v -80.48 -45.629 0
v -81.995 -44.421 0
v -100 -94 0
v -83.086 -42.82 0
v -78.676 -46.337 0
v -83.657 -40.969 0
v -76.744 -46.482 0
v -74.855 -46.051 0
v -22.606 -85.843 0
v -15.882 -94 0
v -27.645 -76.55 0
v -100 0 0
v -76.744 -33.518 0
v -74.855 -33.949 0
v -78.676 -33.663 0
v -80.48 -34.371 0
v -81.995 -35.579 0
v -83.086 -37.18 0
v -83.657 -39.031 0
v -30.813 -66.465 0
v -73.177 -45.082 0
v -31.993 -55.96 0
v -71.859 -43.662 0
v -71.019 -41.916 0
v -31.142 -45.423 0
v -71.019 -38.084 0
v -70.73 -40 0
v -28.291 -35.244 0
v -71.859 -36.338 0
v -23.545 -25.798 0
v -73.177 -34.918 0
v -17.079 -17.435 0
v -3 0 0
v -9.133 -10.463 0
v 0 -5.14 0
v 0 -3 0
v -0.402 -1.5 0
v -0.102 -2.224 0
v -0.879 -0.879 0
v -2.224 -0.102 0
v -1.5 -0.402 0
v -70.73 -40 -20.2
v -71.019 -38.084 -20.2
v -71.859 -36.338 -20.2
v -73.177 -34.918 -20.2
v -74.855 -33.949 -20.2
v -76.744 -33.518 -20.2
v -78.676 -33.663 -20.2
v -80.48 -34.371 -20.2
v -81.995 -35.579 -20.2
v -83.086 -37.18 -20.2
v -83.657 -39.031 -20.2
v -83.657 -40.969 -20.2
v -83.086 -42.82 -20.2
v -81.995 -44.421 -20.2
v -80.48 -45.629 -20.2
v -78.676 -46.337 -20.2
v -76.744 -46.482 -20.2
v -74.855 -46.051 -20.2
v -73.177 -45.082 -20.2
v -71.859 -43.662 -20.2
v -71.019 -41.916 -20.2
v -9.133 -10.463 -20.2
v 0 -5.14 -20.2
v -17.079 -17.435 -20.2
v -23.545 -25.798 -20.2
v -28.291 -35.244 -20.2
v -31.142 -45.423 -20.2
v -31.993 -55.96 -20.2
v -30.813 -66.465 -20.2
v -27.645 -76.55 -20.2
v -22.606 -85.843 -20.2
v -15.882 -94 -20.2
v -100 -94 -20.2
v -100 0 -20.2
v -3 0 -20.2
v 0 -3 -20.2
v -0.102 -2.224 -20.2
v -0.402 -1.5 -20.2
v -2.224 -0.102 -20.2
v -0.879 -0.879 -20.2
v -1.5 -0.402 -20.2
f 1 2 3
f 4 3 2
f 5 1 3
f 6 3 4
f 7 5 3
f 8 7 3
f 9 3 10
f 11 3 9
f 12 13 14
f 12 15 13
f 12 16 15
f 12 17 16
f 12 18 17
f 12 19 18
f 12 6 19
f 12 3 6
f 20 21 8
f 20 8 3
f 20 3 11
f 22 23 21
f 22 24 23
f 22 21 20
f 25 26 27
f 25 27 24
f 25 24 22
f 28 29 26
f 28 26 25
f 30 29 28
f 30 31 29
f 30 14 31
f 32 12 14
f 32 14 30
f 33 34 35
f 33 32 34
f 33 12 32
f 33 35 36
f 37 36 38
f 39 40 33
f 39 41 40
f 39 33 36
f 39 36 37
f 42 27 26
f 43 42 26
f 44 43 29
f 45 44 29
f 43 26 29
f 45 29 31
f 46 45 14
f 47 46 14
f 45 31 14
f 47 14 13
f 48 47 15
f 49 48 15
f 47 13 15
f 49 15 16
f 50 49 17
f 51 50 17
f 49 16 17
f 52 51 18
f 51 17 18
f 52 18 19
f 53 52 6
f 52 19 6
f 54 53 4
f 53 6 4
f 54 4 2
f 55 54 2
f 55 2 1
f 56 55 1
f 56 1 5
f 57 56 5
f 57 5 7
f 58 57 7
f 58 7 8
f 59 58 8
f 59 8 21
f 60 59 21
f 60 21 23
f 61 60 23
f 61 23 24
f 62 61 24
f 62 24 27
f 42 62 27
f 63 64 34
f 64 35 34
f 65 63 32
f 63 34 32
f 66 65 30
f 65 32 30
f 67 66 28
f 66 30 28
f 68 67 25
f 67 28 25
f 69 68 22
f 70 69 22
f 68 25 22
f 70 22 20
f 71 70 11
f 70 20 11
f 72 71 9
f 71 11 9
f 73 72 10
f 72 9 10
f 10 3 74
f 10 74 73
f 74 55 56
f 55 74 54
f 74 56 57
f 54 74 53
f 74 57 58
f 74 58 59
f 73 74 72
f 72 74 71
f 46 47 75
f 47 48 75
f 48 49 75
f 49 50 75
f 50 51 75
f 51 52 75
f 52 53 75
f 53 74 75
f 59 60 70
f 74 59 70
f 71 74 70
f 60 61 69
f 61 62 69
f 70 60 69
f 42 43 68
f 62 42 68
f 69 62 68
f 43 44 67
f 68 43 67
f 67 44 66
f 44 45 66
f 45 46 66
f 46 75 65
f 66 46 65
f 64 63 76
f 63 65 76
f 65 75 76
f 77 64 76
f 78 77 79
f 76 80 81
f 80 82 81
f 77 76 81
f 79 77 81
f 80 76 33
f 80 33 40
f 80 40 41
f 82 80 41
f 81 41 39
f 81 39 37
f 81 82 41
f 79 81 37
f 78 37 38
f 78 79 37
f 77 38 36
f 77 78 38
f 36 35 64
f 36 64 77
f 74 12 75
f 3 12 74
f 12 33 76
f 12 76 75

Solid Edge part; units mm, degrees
sketch "Sketch1" plane through (0, 0, 0) normal (0, 0, 1) x (1, 0, 0)
  line L0 (0, 0) -> (-100, 0)
  line L1 (-100, 0) -> (-100, -94)
  line L2 (-100, -94) -> (0, -94)
  line L3 (0, -94) -> (0, 0)
extrude "Protrusion1" add sketch "Sketch1" against normal blind 20.2
sketch "Sketch2" plane through (-50, -47, 0) normal (0, 0, 1) x (1, 0, 0)
  circle A0 centre (-27.23, 7) radius 6.5
  circle A1 centre (73, -8.1) radius 55
extrude "ExtrudedCutout_1" cut sketch "Sketch2" against normal blind 21
fillet "Round_1" radius 3 1 edges at (0, 0, -10.1)
